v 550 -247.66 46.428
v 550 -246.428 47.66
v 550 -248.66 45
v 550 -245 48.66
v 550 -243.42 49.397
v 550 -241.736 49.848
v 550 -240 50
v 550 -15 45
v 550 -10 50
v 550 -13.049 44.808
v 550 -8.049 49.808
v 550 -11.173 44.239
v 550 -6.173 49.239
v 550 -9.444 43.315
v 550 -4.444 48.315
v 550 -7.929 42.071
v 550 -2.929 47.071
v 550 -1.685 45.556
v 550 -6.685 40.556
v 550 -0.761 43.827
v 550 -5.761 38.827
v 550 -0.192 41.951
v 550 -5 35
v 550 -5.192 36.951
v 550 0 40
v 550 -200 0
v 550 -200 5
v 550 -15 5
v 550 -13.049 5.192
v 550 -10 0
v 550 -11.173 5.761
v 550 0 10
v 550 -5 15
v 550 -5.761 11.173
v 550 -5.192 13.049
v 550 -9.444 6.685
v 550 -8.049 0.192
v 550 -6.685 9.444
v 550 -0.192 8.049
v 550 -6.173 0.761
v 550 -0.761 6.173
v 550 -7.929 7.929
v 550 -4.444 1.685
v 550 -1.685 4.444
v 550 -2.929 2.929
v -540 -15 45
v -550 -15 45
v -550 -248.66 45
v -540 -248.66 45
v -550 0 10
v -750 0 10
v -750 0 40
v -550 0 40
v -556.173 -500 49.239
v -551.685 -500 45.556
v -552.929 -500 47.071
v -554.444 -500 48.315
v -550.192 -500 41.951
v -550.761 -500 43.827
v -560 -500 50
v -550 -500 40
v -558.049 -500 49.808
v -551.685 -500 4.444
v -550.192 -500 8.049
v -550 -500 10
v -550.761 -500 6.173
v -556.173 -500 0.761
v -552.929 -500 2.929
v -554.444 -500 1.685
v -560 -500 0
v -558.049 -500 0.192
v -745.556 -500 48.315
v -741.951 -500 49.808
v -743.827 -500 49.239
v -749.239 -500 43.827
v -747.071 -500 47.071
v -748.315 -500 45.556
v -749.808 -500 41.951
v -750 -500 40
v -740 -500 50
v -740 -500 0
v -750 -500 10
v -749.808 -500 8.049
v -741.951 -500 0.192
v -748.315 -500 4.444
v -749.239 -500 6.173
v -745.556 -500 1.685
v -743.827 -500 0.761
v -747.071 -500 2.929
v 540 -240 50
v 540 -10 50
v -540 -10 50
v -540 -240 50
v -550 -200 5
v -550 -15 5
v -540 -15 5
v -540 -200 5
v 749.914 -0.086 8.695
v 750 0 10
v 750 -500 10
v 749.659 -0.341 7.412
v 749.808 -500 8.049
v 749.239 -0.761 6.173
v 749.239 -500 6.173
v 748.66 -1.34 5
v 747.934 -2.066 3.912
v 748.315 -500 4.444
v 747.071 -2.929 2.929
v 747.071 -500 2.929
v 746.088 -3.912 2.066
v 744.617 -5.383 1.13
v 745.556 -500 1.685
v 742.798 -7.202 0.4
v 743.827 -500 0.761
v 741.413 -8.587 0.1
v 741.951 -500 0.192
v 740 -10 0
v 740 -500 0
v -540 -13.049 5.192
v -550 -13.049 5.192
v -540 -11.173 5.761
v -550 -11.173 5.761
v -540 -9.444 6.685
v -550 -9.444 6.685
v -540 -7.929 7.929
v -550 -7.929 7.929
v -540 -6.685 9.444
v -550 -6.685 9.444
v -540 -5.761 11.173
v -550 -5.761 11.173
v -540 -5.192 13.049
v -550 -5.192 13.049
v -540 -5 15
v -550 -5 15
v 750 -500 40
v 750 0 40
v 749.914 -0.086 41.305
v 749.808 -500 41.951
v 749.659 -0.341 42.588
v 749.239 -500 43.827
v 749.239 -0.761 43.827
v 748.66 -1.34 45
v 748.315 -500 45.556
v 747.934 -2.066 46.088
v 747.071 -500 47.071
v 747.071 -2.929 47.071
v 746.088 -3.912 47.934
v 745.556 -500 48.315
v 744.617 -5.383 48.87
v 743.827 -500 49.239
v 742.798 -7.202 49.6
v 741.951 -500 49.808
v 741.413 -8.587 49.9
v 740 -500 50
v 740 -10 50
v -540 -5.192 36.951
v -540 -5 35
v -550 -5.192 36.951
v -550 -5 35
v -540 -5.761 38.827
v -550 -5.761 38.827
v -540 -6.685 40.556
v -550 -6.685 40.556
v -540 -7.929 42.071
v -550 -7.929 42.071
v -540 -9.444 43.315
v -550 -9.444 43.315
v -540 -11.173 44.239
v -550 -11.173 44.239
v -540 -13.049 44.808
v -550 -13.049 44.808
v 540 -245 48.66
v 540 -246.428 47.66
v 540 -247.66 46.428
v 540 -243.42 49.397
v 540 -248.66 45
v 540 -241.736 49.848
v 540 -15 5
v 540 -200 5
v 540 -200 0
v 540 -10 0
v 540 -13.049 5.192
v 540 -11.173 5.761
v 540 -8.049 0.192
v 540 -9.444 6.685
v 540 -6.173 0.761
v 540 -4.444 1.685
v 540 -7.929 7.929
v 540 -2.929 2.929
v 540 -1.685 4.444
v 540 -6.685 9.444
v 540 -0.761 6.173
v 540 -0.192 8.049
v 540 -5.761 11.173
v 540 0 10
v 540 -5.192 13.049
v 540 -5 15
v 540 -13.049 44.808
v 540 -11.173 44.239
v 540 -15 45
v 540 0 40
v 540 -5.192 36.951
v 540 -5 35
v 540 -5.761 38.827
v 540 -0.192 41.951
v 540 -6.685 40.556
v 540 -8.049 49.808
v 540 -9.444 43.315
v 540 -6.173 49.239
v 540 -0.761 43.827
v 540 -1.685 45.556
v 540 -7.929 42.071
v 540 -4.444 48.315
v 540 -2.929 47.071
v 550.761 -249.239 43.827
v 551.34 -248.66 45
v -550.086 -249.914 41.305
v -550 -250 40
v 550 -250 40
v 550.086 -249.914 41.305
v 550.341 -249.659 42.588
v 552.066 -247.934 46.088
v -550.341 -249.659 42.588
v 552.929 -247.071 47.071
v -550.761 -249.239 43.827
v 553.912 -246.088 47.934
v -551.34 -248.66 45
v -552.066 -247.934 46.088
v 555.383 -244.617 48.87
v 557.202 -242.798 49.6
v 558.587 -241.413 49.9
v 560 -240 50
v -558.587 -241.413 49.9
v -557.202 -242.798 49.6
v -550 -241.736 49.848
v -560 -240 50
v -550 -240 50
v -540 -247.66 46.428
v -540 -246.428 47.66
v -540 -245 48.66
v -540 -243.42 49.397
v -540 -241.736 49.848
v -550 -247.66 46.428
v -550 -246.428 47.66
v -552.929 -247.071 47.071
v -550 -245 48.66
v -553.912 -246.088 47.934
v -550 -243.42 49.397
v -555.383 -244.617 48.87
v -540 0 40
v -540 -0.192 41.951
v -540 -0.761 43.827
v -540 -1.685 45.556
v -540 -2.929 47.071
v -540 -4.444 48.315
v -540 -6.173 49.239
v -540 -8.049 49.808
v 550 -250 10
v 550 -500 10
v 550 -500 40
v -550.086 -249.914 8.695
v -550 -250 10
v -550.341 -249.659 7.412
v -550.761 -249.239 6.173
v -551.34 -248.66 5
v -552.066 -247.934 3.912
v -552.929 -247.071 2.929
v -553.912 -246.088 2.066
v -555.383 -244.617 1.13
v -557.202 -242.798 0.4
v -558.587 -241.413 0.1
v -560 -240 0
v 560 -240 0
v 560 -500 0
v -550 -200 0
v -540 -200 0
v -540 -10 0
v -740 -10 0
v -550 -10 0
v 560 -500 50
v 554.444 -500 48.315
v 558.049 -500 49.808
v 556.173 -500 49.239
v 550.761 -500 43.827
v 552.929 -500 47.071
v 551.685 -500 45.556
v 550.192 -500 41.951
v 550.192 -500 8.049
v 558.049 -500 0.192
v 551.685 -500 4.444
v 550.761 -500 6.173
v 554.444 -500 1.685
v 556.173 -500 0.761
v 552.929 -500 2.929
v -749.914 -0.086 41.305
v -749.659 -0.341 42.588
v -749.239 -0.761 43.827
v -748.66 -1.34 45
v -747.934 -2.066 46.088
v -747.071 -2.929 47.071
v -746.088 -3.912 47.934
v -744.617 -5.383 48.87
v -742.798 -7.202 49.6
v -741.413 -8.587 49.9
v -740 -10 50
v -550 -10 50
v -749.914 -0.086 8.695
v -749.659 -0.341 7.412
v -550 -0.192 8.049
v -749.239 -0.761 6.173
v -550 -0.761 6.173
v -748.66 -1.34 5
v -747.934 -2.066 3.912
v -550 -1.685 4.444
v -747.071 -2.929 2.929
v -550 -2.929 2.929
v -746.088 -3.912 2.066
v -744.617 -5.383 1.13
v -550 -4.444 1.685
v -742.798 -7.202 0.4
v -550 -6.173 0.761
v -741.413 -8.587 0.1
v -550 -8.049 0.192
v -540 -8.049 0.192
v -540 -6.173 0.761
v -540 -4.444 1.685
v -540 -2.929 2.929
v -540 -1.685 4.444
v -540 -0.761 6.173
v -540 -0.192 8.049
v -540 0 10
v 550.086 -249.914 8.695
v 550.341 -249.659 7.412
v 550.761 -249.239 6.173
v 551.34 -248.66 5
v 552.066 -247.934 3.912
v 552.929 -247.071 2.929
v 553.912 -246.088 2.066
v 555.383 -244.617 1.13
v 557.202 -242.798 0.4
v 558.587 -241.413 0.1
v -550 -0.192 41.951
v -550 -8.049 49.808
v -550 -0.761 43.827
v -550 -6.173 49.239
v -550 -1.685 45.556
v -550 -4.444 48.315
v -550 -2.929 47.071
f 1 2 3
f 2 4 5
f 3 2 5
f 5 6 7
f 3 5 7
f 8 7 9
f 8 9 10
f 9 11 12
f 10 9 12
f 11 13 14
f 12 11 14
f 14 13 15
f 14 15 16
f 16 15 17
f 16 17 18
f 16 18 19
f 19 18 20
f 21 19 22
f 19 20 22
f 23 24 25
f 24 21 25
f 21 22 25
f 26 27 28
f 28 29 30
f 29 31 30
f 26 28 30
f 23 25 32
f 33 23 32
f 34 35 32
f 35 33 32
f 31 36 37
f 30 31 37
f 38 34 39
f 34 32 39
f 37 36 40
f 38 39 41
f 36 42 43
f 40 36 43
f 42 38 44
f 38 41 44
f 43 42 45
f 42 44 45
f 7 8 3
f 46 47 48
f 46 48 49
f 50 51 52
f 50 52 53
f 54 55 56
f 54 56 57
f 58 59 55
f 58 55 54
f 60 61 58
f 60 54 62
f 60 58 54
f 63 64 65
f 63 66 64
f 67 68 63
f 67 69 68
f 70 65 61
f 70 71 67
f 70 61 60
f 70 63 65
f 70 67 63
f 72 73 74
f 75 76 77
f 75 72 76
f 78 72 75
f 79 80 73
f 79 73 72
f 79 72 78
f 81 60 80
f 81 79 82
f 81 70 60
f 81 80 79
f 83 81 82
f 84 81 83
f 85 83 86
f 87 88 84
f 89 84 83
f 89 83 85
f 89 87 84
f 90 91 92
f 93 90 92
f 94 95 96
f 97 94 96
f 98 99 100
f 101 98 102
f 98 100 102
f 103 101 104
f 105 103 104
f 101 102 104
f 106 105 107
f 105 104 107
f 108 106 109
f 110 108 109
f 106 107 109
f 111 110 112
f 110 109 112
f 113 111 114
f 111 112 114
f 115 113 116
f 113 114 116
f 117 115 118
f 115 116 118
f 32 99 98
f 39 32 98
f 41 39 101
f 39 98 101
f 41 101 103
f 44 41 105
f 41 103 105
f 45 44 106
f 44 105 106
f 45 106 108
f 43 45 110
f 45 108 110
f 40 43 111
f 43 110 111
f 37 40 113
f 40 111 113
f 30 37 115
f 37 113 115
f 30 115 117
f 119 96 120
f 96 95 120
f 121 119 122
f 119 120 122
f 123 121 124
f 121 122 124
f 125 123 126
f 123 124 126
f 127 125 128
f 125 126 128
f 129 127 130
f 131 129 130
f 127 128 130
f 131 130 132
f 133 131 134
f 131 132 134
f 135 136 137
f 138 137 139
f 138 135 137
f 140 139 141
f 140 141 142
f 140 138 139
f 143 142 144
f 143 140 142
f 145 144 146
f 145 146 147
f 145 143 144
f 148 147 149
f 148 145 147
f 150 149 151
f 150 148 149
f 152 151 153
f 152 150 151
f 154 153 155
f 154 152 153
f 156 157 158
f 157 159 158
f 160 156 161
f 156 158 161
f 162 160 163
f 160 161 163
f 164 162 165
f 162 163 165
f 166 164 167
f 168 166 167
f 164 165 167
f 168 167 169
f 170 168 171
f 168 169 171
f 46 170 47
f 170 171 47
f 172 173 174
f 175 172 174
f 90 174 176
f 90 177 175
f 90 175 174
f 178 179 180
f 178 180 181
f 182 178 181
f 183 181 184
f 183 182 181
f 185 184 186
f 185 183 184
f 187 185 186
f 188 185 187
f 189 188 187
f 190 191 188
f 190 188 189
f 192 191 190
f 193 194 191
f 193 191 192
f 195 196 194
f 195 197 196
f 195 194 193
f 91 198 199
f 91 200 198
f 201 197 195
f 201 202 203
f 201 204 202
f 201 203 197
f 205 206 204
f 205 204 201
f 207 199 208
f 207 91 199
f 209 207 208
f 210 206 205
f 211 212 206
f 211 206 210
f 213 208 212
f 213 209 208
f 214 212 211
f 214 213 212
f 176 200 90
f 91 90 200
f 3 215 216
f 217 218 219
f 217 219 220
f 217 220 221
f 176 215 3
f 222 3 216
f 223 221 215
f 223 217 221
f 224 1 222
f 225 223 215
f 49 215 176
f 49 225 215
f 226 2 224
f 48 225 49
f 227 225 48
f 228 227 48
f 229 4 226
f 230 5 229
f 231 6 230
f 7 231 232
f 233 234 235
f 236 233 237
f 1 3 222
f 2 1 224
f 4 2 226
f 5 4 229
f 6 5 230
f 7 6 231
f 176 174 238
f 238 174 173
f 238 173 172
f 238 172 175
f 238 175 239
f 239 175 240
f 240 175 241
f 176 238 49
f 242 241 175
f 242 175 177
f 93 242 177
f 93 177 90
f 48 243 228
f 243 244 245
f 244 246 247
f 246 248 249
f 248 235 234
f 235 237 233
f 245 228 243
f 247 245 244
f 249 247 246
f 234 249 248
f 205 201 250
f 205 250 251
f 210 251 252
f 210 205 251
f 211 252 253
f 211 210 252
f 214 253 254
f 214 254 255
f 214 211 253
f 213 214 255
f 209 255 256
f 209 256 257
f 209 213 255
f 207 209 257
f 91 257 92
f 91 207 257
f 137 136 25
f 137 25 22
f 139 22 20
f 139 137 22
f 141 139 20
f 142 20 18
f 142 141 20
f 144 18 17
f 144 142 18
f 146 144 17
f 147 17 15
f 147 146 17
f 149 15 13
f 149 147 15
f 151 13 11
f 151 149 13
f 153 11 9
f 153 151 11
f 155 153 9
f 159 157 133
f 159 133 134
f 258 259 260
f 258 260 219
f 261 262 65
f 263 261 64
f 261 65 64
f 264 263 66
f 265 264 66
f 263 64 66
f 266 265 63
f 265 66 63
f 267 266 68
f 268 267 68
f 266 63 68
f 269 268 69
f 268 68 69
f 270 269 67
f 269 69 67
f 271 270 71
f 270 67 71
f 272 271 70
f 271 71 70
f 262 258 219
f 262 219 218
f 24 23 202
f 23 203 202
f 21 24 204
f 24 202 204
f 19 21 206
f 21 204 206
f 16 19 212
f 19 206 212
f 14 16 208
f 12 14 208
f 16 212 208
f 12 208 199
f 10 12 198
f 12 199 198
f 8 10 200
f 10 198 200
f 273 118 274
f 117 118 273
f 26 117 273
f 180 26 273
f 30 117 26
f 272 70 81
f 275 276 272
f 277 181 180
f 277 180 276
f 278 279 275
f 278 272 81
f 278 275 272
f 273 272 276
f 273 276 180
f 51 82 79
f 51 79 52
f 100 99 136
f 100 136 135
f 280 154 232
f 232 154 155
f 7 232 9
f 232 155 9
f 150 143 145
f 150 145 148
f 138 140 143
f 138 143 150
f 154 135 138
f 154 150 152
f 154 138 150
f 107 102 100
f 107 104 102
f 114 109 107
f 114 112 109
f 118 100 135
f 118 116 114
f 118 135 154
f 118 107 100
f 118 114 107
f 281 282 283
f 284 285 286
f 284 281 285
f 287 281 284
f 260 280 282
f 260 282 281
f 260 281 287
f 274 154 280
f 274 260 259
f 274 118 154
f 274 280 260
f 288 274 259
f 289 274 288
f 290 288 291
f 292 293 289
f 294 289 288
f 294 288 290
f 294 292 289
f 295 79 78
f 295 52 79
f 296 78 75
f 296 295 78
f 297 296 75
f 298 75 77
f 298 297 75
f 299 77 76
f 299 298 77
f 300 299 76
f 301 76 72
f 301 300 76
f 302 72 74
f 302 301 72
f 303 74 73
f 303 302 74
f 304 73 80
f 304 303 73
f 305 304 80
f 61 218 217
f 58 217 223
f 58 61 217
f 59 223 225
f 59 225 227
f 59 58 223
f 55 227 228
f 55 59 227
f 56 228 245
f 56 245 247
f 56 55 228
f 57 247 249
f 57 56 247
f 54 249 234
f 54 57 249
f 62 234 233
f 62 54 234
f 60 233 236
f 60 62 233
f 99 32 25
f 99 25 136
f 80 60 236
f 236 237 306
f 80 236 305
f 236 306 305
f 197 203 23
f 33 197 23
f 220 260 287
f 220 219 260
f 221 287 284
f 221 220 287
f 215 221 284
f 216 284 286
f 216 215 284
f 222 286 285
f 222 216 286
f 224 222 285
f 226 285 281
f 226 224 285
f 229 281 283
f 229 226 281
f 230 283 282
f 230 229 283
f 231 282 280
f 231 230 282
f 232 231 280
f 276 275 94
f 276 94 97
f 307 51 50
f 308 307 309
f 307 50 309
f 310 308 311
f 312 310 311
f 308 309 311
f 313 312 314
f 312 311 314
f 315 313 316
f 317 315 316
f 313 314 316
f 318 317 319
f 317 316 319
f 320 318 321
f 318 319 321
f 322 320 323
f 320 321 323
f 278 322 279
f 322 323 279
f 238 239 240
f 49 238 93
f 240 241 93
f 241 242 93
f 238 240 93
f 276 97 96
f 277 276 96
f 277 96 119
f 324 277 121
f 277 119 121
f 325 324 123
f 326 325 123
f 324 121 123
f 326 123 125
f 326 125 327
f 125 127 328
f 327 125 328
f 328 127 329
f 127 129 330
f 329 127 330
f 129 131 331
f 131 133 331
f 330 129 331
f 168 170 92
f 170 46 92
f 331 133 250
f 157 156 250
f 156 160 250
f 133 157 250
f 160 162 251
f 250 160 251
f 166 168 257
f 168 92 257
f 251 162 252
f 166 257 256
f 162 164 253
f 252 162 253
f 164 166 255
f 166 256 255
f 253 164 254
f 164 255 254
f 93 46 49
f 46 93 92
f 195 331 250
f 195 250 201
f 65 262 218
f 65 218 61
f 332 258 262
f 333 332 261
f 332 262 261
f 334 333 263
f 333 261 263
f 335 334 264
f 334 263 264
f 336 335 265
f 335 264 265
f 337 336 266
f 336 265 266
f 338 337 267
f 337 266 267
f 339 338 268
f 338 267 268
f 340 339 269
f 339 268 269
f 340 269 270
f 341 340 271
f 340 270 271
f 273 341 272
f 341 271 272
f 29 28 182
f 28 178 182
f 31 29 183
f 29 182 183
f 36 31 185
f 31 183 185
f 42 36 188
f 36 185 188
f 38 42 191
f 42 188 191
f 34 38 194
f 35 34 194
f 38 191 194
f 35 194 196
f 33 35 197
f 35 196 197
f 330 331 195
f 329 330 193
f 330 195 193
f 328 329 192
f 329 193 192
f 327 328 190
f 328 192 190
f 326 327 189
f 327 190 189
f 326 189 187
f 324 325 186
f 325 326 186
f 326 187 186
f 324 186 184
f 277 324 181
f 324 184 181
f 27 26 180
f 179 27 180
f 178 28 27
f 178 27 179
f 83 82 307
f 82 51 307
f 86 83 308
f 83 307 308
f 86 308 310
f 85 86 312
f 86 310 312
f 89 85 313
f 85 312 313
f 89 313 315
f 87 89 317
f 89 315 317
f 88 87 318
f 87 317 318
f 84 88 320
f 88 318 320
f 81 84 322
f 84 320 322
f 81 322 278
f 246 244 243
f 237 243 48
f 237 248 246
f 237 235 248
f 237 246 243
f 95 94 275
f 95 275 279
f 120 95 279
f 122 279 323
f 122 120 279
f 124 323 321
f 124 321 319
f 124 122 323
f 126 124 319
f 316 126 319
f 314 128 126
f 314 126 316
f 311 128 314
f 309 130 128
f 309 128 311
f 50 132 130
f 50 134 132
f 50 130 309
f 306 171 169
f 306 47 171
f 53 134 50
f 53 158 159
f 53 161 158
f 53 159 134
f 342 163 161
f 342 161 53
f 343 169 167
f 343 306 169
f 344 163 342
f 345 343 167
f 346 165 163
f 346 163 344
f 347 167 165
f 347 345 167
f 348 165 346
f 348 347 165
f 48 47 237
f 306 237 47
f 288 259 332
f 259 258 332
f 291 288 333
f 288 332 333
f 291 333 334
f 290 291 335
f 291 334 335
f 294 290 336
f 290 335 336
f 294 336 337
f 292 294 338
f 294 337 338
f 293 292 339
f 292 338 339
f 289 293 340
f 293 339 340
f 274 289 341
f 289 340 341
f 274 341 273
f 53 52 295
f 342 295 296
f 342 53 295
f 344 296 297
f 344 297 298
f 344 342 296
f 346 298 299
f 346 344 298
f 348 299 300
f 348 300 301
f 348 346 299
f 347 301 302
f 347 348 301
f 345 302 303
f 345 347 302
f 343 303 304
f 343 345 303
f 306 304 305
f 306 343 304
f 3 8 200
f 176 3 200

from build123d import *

# Parameters (mm, degrees)
BOSS_EXTRUDE1_DEPTH = 50
FILLET1_R           = 10
SKETCH2_W           = 10
SKETCH2_H           = 250
CUT_EXTRUDE4_DEPTH  = 5
SKETCH5_W           = 10
SKETCH5_H           = 5
CUT_EXTRUDE16_DEPTH = 200
SKETCH6_W           = 10
SKETCH6_H           = 5
CUT_EXTRUDE17_DEPTH = 50
FILLET2_R           = 10
FILLET3_R           = 10


with BuildPart() as part:
    # Sketch1 → Boss-Extrude1 (new body)
    with BuildSketch(Plane.XY):
        Polygon((-750, 0), (750, 0), (750, -500), (550, -500), (550, -250), (-550, -250), (-550, -500), (-750, -500), align=None)
    extrude(amount=BOSS_EXTRUDE1_DEPTH)

    # Fillet1
    fillet1_edges = [part.edges().sort_by_distance(p)[0] for p in [
        (0, -250, 0),
        (-550, -375, 0),
        (-750, -250, 0),
        (-550, -375, 50),
        (0, -250, 50),
        (550, -375, 50),
        (750, -250, 50),
        (0, 0, 50),
        (-750, -250, 50),
        (0, 0, 0),
        (750, -250, 0),
        (550, -375, 0),
    ]]
    fillet(fillet1_edges, radius=FILLET1_R)

    # Sketch2 → Cut-Extrude4 (cut)
    with BuildSketch(Plane.XY.offset(50)):
        with Locations((-545, -125)):
            Rectangle(SKETCH2_W, SKETCH2_H)
    cut_extrude4 = extrude(amount=-CUT_EXTRUDE4_DEPTH, mode=Mode.SUBTRACT)

    # Mirror1: Cut-Extrude4 across plane
    add(cut_extrude4.mirror(Plane(origin=(0, 0, 0), x_dir=(0, 0, 1), z_dir=(1, 0, 0))), mode=Mode.SUBTRACT)

    # Sketch5 → Cut-Extrude16 (cut)
    with BuildSketch(Plane(origin=(0, 0, 0), x_dir=(1, 0, 0), z_dir=(0, 1, 0))):
        with Locations((-545, -2.5)):
            Rectangle(SKETCH5_W, SKETCH5_H)
    cut_extrude16 = extrude(amount=-CUT_EXTRUDE16_DEPTH, mode=Mode.SUBTRACT)

    # Mirror5: Cut-Extrude16 across plane
    add(cut_extrude16.mirror(Plane(origin=(0, 0, 0), x_dir=(0, 0, 1), z_dir=(1, 0, 0))), mode=Mode.SUBTRACT)

    # Sketch6 → Cut-Extrude17 (cut)
    with BuildSketch(Plane.XY.offset(50)):
        with Locations((545, -2.5)):
            Rectangle(SKETCH6_W, SKETCH6_H)
    cut_extrude17 = extrude(amount=-CUT_EXTRUDE17_DEPTH, mode=Mode.SUBTRACT)

    # Fillet2
    fillet2_edges = [part.edges().sort_by_distance(p)[0] for p in [
        (545, -5, 45),
        (545, -5, 5),
    ]]
    fillet(fillet2_edges, radius=FILLET2_R)

    # Mirror8: Cut-Extrude17 across plane
    add(cut_extrude17.mirror(Plane(origin=(0, 0, 0), x_dir=(0, 0, 1), z_dir=(1, 0, 0))), mode=Mode.SUBTRACT)

    # Fillet3
    fillet3_edges = [part.edges().sort_by_distance(p)[0] for p in [
        (-545, -5, 5),
        (-545, -5, 45),
    ]]
    fillet(fillet3_edges, radius=FILLET3_R)


solid = part.part
